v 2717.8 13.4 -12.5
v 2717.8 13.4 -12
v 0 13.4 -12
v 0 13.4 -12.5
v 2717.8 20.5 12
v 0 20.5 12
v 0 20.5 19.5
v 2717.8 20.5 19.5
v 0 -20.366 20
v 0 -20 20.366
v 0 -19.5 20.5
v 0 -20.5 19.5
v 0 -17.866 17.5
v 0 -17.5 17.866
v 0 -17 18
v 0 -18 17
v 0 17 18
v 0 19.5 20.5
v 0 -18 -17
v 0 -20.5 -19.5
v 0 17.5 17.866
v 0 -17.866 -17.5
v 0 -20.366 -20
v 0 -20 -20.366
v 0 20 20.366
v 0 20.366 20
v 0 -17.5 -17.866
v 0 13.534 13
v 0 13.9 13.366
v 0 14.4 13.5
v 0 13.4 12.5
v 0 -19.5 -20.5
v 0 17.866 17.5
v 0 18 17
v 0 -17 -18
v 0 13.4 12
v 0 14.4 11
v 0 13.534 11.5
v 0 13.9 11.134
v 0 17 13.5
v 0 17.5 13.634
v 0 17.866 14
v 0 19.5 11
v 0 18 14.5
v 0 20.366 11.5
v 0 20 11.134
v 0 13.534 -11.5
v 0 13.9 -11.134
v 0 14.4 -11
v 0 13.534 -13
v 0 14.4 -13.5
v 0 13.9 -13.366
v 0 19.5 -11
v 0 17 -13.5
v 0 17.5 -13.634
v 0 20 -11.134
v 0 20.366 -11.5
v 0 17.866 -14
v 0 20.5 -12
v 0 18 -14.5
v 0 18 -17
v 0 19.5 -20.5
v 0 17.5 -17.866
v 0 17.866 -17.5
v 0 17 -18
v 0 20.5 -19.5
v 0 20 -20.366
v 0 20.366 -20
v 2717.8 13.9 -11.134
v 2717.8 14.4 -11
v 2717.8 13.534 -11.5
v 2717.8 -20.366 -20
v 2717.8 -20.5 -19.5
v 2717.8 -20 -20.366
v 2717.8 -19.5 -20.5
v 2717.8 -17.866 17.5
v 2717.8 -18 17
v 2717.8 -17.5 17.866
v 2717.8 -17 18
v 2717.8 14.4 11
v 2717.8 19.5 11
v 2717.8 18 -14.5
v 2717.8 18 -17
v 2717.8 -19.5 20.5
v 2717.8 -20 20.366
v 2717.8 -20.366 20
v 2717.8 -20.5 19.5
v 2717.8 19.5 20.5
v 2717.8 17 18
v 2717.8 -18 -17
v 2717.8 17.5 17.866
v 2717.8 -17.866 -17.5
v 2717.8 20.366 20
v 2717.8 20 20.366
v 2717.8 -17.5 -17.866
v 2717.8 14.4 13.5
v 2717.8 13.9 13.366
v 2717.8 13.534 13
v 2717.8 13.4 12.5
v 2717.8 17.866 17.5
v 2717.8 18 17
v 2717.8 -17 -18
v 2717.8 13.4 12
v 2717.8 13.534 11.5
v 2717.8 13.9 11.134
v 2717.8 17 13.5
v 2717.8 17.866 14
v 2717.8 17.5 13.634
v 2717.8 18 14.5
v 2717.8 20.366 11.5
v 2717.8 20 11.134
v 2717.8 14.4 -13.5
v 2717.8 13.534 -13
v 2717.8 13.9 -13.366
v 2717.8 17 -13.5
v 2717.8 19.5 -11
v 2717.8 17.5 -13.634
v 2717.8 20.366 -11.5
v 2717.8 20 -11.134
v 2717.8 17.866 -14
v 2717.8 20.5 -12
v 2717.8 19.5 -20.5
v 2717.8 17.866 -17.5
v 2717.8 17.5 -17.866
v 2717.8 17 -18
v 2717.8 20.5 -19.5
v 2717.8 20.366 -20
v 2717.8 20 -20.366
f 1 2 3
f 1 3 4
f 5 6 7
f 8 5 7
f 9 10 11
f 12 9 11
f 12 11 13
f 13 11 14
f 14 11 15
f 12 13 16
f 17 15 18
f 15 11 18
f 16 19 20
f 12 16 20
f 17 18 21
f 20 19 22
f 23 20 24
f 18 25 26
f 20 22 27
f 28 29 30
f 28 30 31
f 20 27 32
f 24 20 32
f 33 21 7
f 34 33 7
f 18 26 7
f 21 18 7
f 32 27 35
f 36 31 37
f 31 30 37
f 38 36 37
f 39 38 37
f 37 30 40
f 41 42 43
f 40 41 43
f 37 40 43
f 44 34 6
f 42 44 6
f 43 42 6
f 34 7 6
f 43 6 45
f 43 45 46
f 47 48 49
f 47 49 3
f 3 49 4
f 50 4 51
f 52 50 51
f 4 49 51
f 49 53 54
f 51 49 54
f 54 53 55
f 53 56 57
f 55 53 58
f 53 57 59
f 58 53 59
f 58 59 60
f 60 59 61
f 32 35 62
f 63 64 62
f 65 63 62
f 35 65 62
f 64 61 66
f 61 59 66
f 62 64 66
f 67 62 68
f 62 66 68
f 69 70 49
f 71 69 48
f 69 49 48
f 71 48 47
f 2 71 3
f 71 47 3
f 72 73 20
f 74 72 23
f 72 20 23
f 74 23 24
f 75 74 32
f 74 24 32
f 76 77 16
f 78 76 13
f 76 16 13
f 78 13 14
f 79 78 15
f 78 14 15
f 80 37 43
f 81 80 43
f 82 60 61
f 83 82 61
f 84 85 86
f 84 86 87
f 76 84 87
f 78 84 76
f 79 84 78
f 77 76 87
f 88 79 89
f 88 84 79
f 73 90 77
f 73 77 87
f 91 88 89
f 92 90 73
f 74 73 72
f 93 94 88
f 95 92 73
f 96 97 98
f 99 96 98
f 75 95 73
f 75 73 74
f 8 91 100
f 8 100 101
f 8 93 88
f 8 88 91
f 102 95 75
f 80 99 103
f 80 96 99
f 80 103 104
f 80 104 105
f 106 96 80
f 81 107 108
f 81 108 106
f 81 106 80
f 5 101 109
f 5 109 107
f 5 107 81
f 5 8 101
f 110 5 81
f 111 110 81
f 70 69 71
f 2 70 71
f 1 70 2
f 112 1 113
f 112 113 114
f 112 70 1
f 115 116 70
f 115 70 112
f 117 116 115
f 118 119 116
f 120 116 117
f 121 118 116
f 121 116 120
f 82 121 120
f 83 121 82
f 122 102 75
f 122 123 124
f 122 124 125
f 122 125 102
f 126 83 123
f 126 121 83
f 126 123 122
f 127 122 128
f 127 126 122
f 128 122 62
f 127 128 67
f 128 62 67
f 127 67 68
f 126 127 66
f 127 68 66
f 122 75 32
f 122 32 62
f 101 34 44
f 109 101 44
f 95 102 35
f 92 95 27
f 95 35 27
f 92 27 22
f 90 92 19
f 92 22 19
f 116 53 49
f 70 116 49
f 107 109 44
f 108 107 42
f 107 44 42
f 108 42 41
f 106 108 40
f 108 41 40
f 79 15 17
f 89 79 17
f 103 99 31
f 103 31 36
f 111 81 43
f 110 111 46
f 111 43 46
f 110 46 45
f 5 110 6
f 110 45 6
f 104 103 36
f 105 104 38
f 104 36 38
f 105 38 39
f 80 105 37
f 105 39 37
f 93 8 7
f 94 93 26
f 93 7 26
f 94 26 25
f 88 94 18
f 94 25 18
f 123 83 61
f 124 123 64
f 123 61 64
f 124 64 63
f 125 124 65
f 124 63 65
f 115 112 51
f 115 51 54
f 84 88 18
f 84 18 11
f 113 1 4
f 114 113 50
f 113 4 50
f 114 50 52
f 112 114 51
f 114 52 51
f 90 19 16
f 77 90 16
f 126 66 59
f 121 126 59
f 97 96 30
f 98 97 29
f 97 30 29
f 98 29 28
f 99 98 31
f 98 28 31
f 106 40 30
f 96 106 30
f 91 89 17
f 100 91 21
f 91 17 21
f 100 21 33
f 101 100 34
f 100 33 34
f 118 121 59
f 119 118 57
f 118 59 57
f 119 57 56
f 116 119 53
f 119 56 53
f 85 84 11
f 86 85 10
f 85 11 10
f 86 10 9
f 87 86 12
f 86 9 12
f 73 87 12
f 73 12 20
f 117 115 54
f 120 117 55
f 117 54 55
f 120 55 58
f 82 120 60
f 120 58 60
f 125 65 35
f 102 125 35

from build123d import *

# Parameters (mm, degrees)
BOSS_EXTRUDE1_DEPTH = 2717.8


with BuildPart() as part:
    # Sketch1 → Boss-Extrude1 (new body)
    with BuildSketch(Plane(origin=(0, 0, 0), x_dir=(0, 0, -1), z_dir=(1, 0, 0))):
        with BuildLine():
            Line((-18, -17), (-18, 17))
            ThreePointArc((-18, 17), (-17.707106781, 17.707106781), (-17, 18))
            Line((-17, 18), (-14.5, 18))
            ThreePointArc((-14.5, 18), (-13.792893219, 17.707106781), (-13.5, 17))
            Line((-13.5, 17), (-13.5, 14.4))
            ThreePointArc((-13.5, 14.4), (-13.207106781, 13.692893219), (-12.5, 13.4))
            Line((-12.5, 13.4), (-12, 13.4))
            ThreePointArc((-12, 13.4), (-11.292893219, 13.692893219), (-11, 14.4))
            Line((-11, 14.4), (-11, 19.5))
            ThreePointArc((-11, 19.5), (-11.292893219, 20.207106781), (-12, 20.5))
            Line((-12, 20.5), (-19.5, 20.5))
            ThreePointArc((-19.5, 20.5), (-20.207106781, 20.207106781), (-20.5, 19.5))
            Line((-20.5, 19.5), (-20.5, -19.5))
            ThreePointArc((-20.5, -19.5), (-20.207106781, -20.207106781), (-19.5, -20.5))
            Line((-19.5, -20.5), (19.5, -20.5))
            ThreePointArc((19.5, -20.5), (20.207106781, -20.207106781), (20.5, -19.5))
            Line((20.5, -19.5), (20.5, 19.5))
            ThreePointArc((20.5, 19.5), (20.207106781, 20.207106781), (19.5, 20.5))
            Line((19.5, 20.5), (12, 20.5))
            ThreePointArc((12, 20.5), (11.292893219, 20.207106781), (11, 19.5))
            Line((11, 19.5), (11, 14.4))
            ThreePointArc((11, 14.4), (11.292893219, 13.692893219), (12, 13.4))
            Line((12, 13.4), (12.5, 13.4))
            ThreePointArc((12.5, 13.4), (13.207106781, 13.692893219), (13.5, 14.4))
            Line((13.5, 14.4), (13.5, 17))
            ThreePointArc((13.5, 17), (13.792893219, 17.707106781), (14.5, 18))
            Line((14.5, 18), (17, 18))
            ThreePointArc((17, 18), (17.707106781, 17.707106781), (18, 17))
            Line((18, 17), (18, -17))
            ThreePointArc((18, -17), (17.707106781, -17.707106781), (17, -18))
            Line((17, -18), (-17, -18))
            ThreePointArc((-17, -18), (-17.707106781, -17.707106781), (-18, -17))
        make_face()
    extrude(amount=BOSS_EXTRUDE1_DEPTH)


solid = part.part
